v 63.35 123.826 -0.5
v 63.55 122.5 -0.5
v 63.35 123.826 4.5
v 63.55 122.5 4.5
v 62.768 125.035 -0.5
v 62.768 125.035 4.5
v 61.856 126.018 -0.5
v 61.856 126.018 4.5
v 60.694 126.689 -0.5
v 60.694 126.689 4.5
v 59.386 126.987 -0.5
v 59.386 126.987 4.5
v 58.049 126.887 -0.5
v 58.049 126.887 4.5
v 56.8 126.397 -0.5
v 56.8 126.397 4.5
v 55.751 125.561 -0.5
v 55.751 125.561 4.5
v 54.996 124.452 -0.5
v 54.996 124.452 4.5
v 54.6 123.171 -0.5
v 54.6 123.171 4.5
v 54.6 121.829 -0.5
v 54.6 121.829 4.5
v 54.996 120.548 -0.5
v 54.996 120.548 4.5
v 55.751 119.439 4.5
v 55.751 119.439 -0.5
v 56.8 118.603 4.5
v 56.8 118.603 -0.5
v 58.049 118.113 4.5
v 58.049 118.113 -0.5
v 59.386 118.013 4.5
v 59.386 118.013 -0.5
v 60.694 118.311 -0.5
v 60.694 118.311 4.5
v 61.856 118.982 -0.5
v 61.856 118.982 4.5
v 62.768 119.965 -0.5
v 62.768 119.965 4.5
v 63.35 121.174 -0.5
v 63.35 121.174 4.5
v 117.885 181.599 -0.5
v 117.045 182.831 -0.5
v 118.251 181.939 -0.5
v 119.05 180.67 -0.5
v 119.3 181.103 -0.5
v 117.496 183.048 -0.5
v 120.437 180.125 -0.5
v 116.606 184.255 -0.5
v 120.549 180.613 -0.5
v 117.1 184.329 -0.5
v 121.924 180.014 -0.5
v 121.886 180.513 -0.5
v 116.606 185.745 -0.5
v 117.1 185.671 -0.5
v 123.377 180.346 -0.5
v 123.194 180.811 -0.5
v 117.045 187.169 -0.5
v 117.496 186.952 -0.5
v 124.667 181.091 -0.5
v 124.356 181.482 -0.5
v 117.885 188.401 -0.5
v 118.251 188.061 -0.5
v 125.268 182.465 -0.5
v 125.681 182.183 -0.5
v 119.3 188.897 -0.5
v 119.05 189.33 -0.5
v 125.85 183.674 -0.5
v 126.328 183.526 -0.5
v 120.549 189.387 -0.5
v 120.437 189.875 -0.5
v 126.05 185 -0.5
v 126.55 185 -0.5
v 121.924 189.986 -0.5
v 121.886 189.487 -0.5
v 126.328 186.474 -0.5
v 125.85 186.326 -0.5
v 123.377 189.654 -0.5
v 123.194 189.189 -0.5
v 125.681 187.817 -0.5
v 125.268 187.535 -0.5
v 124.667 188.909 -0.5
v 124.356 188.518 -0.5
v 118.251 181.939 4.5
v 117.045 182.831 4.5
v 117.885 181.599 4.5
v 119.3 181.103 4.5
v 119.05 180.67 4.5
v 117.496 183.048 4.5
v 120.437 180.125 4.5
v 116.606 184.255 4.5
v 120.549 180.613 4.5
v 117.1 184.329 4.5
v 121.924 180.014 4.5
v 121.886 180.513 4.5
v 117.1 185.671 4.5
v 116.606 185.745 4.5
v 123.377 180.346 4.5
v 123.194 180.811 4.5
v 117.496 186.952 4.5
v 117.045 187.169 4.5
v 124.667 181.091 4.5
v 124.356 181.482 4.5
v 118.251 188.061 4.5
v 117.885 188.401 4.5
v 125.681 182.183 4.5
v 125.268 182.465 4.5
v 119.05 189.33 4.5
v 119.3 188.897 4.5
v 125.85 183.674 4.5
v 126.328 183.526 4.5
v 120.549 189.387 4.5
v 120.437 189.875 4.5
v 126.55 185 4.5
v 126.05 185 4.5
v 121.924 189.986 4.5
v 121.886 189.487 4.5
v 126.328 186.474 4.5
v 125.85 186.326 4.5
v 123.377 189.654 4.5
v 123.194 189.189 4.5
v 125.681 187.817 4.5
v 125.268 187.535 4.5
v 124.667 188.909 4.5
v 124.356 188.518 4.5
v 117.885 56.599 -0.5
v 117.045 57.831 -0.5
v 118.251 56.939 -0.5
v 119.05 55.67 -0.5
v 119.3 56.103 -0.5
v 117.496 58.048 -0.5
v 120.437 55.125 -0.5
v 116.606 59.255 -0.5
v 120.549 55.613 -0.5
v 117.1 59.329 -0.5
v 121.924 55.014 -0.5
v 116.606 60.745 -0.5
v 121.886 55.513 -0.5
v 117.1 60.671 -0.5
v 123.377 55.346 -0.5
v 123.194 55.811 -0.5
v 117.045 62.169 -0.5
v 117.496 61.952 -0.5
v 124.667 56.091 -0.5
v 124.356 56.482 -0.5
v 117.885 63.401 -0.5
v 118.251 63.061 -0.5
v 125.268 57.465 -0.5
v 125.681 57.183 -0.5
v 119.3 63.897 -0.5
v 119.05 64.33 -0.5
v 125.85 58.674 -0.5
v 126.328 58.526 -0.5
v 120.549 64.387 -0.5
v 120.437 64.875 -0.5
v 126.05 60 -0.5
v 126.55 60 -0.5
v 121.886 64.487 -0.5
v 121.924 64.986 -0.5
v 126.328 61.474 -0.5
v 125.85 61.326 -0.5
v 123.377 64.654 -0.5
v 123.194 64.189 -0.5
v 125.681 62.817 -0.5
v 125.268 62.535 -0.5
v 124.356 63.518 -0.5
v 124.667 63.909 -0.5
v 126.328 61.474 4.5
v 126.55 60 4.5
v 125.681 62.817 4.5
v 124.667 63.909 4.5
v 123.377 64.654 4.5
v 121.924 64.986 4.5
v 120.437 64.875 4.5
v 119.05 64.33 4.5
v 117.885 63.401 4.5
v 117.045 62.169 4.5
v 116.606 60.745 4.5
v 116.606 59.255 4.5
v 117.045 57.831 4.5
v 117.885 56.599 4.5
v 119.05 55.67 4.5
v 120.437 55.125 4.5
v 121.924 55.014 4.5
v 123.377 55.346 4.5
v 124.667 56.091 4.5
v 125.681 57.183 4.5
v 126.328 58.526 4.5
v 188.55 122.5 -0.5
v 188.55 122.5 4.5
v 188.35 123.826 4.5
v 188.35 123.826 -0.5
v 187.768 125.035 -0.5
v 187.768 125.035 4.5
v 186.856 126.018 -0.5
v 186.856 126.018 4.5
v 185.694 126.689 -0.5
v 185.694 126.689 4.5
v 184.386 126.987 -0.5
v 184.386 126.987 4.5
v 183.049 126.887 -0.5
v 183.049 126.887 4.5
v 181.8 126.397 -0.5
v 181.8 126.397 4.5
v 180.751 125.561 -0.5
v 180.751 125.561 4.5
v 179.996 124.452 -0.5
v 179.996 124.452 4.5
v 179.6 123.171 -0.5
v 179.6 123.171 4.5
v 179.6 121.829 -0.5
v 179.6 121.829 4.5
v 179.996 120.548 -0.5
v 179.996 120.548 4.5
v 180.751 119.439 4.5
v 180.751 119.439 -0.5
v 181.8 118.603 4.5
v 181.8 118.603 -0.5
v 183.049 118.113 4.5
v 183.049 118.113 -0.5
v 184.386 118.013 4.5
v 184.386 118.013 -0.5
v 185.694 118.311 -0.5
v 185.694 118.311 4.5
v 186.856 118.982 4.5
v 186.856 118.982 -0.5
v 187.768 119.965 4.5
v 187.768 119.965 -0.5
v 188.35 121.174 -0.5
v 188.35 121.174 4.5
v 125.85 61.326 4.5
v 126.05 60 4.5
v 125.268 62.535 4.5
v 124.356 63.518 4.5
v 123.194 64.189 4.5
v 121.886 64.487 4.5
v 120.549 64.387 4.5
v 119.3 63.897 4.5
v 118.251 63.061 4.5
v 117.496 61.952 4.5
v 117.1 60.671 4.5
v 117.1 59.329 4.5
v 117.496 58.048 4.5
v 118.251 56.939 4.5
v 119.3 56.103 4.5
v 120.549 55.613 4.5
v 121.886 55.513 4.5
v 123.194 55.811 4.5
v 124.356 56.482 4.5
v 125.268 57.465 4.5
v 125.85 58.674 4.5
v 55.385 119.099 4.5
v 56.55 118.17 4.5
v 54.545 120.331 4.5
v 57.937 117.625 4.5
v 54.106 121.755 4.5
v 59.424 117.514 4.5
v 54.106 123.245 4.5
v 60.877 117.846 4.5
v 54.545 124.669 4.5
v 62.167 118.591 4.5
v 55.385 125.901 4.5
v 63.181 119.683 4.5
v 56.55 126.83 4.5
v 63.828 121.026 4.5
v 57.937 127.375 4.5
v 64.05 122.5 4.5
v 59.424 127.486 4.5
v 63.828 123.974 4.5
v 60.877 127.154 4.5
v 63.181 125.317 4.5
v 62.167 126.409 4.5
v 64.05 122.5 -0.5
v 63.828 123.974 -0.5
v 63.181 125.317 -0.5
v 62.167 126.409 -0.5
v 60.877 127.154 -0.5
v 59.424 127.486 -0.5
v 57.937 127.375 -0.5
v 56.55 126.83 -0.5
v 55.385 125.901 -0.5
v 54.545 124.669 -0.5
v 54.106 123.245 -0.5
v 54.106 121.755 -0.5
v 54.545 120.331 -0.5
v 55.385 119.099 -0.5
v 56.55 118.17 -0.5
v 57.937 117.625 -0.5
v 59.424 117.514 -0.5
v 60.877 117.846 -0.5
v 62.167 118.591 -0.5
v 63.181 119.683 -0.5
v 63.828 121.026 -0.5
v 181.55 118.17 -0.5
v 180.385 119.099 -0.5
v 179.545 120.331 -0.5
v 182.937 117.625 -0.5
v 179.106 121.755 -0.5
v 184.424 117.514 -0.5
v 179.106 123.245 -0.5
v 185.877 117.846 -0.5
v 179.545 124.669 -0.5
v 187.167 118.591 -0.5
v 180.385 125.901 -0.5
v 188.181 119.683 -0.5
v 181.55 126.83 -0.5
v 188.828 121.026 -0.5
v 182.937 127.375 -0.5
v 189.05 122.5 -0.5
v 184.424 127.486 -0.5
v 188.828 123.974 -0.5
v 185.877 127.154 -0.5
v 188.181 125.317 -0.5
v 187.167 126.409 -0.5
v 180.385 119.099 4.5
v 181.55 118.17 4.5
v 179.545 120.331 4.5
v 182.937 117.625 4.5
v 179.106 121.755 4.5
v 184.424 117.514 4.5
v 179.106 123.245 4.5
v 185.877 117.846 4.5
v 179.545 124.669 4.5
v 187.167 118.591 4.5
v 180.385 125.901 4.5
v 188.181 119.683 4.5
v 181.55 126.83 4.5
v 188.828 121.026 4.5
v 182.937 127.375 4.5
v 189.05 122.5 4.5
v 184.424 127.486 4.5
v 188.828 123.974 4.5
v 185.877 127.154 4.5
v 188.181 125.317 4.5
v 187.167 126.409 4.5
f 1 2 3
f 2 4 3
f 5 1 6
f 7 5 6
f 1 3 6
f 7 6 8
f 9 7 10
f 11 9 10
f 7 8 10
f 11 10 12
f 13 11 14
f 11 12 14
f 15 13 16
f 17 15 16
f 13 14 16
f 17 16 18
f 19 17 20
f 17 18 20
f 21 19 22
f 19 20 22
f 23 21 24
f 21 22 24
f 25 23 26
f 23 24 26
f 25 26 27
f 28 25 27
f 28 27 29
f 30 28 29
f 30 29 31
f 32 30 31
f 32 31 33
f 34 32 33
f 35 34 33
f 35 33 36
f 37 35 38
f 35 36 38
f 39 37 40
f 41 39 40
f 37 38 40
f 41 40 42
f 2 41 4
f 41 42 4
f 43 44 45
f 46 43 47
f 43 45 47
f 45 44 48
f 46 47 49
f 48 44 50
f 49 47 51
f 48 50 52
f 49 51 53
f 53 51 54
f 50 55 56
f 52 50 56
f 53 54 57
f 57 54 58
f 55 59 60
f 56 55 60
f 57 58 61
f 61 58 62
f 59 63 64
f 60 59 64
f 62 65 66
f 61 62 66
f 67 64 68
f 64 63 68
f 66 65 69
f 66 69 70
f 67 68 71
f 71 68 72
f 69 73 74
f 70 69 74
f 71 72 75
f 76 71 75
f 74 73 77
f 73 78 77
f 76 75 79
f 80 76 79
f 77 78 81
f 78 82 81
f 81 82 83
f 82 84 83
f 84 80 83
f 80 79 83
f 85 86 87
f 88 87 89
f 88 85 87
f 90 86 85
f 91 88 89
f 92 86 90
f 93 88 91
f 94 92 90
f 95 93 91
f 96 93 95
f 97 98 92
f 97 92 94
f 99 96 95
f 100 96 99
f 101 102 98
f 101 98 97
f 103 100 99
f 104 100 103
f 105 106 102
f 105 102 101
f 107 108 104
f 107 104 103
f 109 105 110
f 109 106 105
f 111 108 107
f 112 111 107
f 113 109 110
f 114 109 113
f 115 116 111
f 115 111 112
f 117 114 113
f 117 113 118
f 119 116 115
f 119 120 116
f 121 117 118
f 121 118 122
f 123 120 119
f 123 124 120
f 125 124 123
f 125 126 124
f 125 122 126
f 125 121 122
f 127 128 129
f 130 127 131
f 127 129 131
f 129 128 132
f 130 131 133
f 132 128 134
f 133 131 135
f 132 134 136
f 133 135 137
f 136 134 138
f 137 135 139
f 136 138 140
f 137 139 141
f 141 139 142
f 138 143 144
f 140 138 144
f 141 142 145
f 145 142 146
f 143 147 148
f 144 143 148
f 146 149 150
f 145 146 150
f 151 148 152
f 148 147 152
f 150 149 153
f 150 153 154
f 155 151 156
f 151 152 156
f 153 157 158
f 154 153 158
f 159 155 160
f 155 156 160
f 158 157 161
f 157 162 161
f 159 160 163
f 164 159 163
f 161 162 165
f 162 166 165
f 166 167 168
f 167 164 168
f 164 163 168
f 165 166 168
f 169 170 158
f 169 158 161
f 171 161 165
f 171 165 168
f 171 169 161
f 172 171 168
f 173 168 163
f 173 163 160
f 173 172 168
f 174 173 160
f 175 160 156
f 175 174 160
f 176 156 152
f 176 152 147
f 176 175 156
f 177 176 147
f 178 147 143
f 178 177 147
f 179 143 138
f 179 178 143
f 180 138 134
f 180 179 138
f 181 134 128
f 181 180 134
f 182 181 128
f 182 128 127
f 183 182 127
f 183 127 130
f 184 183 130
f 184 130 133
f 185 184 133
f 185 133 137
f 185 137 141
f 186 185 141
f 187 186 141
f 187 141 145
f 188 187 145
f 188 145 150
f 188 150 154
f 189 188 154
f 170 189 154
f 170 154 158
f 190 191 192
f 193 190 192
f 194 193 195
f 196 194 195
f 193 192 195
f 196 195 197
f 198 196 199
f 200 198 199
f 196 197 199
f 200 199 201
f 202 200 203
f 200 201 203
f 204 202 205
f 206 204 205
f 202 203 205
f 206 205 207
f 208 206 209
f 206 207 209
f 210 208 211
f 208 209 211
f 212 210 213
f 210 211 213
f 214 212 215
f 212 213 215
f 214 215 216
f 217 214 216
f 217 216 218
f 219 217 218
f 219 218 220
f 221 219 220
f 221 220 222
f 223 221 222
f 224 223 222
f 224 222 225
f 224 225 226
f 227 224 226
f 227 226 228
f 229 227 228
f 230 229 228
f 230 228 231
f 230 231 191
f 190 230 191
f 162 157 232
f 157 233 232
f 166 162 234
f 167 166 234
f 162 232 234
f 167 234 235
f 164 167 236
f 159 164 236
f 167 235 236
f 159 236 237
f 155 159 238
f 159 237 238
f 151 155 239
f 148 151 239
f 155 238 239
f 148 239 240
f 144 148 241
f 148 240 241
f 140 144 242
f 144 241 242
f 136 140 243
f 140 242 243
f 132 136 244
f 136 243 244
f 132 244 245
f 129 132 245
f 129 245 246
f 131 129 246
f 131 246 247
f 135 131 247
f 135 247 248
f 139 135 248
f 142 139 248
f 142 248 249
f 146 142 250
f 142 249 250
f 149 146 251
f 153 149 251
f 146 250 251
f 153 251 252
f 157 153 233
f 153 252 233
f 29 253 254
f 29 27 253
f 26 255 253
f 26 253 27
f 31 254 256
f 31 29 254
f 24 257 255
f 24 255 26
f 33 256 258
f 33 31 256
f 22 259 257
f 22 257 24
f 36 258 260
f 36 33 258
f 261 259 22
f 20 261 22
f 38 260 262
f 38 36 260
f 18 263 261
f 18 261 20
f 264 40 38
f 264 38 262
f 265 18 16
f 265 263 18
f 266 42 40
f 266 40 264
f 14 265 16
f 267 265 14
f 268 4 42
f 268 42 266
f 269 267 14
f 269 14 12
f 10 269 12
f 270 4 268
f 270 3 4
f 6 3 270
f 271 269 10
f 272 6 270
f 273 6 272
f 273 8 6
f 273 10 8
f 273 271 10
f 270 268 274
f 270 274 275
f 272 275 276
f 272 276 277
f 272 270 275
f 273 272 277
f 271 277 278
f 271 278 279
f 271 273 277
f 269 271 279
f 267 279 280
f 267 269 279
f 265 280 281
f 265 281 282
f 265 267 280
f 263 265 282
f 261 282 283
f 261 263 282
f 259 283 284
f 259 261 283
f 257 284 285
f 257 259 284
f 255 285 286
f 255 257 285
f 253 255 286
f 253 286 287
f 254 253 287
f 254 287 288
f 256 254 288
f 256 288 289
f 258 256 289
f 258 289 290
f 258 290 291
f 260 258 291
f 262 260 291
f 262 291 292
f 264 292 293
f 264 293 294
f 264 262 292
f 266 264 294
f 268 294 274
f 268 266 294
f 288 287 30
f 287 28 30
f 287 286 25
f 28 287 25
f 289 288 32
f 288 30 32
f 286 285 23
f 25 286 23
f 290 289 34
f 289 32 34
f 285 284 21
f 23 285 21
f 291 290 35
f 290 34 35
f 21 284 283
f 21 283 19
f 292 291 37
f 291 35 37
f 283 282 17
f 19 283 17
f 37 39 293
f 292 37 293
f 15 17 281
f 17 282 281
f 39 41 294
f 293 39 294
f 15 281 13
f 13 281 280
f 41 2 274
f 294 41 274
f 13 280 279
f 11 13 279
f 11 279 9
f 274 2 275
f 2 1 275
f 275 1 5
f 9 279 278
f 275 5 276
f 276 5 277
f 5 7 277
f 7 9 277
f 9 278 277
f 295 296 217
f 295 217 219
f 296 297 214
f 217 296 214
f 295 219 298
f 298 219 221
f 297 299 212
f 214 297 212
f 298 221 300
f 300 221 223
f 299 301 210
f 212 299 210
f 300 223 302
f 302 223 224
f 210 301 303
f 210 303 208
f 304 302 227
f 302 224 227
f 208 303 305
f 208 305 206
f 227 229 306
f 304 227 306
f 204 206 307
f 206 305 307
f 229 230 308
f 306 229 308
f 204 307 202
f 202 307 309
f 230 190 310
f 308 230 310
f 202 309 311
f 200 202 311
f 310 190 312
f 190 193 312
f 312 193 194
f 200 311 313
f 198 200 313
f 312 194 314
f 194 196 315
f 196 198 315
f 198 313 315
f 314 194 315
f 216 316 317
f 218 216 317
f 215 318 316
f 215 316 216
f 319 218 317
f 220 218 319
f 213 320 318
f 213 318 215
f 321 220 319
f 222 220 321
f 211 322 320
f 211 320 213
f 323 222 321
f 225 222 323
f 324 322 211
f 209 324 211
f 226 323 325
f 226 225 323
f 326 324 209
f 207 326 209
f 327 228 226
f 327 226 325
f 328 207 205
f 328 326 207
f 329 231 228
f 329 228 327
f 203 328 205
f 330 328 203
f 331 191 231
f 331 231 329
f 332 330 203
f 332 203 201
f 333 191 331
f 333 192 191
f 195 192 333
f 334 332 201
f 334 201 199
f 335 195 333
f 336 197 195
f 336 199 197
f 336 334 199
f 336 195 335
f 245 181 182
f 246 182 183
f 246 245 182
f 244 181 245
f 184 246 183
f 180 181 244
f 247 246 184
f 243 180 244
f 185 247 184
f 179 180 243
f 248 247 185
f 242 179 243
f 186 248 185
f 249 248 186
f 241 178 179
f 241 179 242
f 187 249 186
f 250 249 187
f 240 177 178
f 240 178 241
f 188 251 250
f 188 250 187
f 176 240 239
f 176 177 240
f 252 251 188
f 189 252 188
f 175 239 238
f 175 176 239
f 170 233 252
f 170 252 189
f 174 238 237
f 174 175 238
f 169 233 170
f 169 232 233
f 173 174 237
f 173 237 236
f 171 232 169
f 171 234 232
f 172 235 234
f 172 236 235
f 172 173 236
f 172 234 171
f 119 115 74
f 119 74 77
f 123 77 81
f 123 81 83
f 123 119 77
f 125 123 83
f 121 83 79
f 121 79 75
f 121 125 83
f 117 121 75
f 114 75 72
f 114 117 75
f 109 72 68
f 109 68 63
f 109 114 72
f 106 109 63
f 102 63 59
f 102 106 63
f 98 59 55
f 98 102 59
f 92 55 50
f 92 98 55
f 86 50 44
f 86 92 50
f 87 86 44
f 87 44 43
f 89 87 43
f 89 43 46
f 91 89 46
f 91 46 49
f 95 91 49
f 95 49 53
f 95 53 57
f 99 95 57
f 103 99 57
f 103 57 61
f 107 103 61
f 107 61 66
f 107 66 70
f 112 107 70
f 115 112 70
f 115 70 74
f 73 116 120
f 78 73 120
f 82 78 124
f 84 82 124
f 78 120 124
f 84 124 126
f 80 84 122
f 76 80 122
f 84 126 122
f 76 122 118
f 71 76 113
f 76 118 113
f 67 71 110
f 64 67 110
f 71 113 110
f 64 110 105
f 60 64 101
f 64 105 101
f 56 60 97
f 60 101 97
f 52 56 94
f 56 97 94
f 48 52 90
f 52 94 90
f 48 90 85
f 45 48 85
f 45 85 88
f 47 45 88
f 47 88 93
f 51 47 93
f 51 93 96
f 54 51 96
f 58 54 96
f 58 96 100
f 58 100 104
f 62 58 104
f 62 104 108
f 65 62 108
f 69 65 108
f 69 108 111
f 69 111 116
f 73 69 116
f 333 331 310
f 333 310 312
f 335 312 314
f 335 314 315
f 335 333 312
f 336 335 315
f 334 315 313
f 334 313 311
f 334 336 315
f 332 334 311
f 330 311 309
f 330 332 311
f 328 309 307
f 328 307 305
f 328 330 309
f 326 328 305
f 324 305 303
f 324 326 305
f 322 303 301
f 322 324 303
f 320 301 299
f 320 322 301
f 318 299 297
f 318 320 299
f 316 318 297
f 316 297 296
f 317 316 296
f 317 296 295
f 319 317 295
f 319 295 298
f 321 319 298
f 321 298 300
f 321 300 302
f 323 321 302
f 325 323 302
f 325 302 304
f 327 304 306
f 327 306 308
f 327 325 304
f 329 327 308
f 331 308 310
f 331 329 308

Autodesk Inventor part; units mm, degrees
ref_plane "YZ Plane" through (0, 0, 0) normal (1, 0, 0) x (0, 1, 0)
ref_plane "XZ Plane" through (0, 0, 0) normal (0, 1, 0) x (-1, 0, 0)
ref_plane "XY Plane" through (0, 0, 0) normal (0, 0, 1) x (1, 0, 0)
sketch "Sketch1" plane through (19.2334, 117.838, 4.5) normal (0, 0, 1) x (1, 0, 0)
  circle A0 centre (102.3166, 4.662) radius 62.5 construction
  line L0 (-19.2334, 159.3689) -> (-19.2334, -164.0391) projected
  line L1 (-65.3026, -117.838) -> (257.1813, -117.838) projected
  line L2 (102.3166, 4.662) -> (102.3166, -57.838) construction
  circle A1 centre (102.3166, -57.838) radius 5
  line L3 (102.3166, 4.662) -> (102.3166, 67.162) construction
  circle A2 centre (102.3166, 67.162) radius 5
  line L4 (102.3166, 4.662) -> (39.8166, 4.662) construction
  circle A3 centre (39.8166, 4.662) radius 5
  line L5 (102.3166, 4.662) -> (164.8166, 4.662) construction
  circle A4 centre (164.8166, 4.662) radius 5
  circle A5 centre (102.3166, -57.838) radius 4.5
  circle A6 centre (39.8166, 4.662) radius 4.5
  circle A7 centre (102.3166, 67.162) radius 4.5
  circle A8 centre (164.8166, 4.662) radius 4.5
  point P0 (-19.2334, -117.838)
  dimension "d0" = 125
  dimension "d1" = 122.5
  dimension "d2" = 121.55
  dimension "d3" = 10
  dimension "d4" = 9
extrude "Extrusion1" add sketch "Sketch1" against normal blind 5
properties part number "Arashi Rear Brake Disc Rotors"
